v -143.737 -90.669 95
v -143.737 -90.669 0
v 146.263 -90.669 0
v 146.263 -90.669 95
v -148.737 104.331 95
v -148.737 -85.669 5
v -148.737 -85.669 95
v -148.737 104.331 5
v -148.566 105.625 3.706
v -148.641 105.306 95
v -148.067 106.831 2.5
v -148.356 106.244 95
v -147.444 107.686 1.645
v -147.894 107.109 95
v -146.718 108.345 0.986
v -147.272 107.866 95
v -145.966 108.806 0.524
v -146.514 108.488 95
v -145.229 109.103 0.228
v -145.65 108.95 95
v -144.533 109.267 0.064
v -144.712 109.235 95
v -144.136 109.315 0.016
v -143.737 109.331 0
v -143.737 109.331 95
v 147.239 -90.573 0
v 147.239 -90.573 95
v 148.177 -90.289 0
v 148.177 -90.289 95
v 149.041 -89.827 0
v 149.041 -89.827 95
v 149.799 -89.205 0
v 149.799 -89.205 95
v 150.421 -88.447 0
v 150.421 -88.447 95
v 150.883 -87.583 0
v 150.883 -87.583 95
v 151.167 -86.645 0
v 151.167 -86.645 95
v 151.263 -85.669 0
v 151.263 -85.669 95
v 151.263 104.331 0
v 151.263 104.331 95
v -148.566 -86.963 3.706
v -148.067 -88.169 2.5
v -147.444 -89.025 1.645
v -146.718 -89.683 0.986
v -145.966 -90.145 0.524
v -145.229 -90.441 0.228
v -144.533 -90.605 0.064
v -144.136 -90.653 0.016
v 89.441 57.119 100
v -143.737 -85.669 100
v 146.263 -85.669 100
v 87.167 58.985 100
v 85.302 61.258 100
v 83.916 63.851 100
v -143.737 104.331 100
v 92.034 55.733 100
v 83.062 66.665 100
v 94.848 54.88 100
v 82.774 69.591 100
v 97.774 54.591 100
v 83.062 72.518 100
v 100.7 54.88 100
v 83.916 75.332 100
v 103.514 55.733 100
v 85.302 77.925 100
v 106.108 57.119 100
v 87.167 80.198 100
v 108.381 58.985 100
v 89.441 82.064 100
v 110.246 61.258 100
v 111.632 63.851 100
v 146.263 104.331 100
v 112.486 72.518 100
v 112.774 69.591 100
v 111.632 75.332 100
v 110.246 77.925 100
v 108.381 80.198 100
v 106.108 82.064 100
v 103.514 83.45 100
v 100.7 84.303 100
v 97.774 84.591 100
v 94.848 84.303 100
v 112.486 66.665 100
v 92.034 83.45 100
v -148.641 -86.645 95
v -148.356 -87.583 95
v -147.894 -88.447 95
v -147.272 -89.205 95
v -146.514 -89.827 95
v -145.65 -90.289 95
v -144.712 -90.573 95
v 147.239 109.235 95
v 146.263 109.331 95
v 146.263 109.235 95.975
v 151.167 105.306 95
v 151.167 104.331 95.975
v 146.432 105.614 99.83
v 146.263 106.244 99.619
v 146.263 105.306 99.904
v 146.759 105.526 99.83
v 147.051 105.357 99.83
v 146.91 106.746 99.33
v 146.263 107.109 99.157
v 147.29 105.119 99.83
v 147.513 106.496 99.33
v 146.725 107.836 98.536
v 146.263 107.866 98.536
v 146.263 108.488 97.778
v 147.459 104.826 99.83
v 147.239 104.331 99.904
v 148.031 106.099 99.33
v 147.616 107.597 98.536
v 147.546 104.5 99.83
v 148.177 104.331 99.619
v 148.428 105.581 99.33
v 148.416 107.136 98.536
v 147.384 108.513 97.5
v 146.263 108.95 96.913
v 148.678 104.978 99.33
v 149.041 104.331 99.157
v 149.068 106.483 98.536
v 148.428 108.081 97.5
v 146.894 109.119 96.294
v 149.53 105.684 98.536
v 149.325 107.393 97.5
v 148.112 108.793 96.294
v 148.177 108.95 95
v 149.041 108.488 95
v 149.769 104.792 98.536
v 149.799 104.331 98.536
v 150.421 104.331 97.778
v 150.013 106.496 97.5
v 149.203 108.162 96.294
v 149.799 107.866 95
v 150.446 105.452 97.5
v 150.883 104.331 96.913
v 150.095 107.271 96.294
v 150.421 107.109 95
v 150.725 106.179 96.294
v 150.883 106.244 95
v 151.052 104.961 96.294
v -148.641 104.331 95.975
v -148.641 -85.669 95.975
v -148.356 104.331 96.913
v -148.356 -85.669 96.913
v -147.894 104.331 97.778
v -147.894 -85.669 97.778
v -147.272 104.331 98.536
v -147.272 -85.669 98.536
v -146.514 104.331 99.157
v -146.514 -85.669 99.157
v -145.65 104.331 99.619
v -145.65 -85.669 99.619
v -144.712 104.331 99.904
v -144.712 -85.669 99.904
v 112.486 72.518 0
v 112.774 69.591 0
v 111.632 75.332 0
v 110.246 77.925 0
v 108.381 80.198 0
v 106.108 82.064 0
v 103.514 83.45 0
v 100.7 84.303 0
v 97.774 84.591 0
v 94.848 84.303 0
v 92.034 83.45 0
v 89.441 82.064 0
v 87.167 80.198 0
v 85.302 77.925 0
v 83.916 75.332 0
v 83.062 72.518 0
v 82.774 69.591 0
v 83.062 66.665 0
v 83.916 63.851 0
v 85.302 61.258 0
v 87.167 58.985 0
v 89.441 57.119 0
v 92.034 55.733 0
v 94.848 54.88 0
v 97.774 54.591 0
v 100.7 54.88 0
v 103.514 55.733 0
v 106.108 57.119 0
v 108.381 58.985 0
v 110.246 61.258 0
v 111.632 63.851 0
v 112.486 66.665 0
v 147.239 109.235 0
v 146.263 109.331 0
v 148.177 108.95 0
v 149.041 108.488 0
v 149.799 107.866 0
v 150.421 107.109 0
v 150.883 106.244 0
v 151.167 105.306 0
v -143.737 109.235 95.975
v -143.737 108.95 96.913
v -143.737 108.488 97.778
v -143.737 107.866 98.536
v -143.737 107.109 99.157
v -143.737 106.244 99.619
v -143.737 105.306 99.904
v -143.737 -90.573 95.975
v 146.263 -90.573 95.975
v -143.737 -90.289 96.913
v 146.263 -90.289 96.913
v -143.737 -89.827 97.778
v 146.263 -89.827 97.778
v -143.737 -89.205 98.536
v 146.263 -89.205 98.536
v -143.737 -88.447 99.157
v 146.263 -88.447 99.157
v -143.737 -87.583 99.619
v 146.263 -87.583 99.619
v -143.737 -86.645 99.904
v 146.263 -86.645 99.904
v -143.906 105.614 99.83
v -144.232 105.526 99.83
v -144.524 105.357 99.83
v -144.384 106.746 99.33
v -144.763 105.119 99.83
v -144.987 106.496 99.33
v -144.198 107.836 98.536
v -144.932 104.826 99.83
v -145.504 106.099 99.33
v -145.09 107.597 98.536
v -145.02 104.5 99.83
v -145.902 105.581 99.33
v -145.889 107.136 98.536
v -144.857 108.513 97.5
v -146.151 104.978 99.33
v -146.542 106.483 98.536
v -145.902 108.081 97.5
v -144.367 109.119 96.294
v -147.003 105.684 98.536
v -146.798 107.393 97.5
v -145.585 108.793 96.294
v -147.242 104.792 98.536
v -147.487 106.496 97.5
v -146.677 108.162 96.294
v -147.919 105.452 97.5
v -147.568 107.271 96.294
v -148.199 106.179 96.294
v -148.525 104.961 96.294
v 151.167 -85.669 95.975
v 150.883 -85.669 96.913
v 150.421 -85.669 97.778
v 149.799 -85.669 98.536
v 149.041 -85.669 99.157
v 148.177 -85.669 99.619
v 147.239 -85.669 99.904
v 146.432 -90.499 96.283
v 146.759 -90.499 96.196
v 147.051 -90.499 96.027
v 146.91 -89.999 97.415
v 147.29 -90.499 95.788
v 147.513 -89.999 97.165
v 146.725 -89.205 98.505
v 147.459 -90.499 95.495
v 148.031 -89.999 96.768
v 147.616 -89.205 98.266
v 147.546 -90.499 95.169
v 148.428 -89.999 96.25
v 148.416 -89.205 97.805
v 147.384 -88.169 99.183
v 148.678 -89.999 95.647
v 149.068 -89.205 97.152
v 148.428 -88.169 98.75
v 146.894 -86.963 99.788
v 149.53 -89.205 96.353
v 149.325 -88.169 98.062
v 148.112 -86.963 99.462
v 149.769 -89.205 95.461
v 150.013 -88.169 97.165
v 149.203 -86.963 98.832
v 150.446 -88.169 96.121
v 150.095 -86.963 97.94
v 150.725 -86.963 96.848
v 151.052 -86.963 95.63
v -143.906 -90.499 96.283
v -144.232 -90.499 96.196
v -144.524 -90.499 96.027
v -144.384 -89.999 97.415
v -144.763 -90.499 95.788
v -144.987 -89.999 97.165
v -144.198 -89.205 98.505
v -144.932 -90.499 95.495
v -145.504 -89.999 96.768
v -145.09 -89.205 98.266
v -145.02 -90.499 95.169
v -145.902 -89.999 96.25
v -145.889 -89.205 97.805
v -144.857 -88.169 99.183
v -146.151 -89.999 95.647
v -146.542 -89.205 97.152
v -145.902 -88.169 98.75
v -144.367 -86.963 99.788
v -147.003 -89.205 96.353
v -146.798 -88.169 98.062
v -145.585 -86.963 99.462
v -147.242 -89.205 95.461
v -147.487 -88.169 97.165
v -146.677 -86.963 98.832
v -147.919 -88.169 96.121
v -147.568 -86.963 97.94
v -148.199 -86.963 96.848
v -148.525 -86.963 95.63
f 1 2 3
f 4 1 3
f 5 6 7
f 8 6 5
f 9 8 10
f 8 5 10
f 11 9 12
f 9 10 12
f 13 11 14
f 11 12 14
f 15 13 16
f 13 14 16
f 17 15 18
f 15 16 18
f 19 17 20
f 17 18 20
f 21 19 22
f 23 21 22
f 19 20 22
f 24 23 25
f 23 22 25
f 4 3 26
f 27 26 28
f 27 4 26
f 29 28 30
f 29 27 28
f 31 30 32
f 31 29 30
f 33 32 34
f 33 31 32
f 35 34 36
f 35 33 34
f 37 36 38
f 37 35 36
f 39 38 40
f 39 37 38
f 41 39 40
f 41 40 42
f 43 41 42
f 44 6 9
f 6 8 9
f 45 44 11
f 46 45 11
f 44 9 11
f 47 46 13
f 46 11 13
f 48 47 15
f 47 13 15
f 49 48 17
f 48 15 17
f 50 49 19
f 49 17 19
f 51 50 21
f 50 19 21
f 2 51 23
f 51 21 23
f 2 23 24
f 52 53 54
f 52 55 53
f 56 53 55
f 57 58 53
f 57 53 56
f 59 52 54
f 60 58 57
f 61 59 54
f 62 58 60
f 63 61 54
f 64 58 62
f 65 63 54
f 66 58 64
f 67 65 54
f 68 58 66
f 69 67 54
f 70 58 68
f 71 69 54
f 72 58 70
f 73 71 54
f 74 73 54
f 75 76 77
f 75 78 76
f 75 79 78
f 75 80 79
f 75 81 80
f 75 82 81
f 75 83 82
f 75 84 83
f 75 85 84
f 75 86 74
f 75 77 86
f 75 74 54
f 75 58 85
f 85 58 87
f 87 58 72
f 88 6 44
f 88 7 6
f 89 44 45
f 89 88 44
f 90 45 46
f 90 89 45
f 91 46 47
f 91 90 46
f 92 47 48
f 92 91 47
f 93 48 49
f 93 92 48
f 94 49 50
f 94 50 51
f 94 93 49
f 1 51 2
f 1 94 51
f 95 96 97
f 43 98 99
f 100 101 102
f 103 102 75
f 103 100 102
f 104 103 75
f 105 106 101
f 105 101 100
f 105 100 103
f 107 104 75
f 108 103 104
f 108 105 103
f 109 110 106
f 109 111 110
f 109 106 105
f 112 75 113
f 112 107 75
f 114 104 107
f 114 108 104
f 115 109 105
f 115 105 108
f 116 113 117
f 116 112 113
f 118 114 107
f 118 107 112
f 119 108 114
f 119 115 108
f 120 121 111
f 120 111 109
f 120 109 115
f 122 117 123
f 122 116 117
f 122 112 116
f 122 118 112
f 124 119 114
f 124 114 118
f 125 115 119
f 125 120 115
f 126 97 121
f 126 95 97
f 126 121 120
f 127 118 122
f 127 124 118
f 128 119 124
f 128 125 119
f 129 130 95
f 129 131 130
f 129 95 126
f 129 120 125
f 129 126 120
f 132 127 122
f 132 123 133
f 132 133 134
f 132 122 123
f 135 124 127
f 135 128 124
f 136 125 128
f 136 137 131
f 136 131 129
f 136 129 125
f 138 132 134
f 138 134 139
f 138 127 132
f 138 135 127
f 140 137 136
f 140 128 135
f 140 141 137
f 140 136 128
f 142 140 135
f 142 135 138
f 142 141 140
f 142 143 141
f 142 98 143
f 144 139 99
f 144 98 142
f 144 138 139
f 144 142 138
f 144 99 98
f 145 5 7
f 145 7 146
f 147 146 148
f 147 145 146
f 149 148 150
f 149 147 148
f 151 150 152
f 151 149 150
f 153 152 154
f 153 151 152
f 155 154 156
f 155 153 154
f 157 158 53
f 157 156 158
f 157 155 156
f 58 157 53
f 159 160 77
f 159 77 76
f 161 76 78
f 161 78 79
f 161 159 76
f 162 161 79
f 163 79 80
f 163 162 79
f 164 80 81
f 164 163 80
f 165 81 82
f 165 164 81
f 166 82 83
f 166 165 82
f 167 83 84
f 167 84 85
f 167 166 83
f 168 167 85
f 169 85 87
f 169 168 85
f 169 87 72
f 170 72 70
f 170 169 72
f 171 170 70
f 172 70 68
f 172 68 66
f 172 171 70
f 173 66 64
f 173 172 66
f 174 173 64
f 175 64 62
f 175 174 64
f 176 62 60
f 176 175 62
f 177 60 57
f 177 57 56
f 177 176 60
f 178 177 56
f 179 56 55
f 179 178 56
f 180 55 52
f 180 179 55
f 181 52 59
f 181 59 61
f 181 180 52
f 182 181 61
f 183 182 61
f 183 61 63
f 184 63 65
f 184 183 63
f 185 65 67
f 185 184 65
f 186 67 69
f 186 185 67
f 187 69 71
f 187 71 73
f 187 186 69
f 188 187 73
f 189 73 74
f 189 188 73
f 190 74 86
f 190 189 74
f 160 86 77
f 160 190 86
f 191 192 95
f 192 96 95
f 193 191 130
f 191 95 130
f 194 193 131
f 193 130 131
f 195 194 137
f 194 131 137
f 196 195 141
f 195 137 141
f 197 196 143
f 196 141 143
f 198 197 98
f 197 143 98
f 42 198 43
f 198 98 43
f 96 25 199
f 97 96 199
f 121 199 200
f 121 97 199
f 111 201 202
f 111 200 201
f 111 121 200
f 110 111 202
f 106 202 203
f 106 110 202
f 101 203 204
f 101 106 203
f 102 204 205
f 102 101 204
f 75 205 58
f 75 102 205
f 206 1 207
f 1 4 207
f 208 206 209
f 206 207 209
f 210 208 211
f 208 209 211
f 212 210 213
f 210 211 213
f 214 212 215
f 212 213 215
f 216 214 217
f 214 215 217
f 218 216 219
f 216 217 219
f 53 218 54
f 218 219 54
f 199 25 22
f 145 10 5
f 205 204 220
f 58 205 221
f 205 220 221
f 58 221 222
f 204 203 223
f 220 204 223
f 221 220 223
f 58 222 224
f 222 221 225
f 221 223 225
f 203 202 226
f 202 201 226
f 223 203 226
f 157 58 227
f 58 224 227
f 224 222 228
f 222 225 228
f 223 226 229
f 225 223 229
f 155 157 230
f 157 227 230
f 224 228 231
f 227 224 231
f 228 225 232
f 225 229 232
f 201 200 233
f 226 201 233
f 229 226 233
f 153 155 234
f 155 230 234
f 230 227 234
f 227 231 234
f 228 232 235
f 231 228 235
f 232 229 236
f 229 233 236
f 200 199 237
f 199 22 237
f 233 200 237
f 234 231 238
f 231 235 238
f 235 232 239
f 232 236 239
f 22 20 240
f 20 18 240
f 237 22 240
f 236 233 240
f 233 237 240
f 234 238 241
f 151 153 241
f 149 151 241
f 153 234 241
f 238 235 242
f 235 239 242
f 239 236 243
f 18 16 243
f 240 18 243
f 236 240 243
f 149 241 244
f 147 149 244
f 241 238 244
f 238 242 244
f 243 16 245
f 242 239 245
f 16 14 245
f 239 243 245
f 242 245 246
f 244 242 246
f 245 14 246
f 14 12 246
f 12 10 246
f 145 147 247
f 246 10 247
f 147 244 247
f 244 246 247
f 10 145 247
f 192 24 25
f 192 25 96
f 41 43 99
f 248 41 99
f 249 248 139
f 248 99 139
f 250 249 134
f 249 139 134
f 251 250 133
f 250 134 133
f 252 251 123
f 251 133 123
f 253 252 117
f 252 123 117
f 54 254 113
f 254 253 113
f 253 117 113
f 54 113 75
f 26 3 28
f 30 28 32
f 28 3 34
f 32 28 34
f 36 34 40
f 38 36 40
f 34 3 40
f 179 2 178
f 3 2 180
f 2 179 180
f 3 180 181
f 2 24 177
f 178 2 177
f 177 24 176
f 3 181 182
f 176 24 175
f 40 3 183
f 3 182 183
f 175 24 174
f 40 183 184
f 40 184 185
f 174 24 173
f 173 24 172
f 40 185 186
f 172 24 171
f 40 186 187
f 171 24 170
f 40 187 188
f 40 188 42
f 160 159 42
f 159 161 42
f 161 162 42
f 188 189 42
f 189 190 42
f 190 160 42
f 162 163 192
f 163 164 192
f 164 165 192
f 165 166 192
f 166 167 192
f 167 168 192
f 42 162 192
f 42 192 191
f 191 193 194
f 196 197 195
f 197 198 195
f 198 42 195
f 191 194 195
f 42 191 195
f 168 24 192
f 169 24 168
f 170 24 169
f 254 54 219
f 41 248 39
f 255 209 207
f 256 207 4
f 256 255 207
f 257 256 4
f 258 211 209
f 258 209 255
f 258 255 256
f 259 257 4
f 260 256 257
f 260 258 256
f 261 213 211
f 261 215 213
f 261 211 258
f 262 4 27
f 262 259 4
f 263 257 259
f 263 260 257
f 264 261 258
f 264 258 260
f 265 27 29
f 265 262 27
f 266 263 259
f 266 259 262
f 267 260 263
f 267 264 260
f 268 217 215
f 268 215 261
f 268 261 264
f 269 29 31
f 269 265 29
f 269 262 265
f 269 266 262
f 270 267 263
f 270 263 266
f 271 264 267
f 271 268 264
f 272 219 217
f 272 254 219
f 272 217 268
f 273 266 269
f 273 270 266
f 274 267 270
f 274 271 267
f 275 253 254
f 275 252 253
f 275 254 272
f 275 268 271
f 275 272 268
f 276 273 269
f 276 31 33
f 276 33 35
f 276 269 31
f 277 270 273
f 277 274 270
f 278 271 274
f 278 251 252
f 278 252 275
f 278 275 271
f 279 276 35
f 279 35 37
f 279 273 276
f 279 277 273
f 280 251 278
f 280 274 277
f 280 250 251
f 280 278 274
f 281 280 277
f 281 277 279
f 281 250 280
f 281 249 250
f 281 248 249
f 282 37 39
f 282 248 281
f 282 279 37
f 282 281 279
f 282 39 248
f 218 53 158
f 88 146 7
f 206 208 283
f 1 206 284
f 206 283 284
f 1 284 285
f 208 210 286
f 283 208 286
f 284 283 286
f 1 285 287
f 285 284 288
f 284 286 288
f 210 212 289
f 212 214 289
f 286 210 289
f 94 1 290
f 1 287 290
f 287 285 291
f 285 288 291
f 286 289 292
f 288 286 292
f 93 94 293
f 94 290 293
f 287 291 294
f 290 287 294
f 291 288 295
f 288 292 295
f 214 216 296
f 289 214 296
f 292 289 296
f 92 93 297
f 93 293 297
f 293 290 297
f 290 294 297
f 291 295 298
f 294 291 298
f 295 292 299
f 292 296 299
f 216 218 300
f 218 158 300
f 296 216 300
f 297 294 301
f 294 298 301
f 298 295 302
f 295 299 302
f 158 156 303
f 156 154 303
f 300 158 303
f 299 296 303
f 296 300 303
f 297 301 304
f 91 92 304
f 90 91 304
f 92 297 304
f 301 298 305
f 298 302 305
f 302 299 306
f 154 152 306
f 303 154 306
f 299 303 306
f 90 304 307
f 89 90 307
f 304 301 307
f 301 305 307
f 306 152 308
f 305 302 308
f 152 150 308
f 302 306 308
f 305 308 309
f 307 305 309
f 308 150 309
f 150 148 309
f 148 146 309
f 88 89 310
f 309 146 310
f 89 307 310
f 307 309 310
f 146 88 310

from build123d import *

# Parameters (mm, degrees)
F0_W     = 300
F0_H     = 200
F0_R     = 15
F1_DEPTH = 100
F2_R     = 5


with BuildPart() as f1:
    # F0 (on Top) → F1 (new body)
    with BuildSketch(Plane.XY):
        with Locations((1.263371, 9.330785)):
            Rectangle(F0_W, F0_H)
        with Locations((97.774066, 69.591478)):
            Circle(F0_R, mode=Mode.SUBTRACT)
    extrude(amount=F1_DEPTH)

    # F2
    f2_edges = [f1.edges().sort_by_distance(p)[0] for p in [
        (-148.736629, 109.330785, 50),
        (151.263371, 109.330785, 50),
        (1.263371, 109.330785, 100),
        (151.263371, 9.330785, 100),
        (-148.736629, 9.330785, 100),
        (1.263371, -90.669215, 100),
        (-148.736629, -90.669215, 50),
        (-148.736629, 9.330785, 0),
        (151.263371, -90.669215, 50),
    ]]
    fillet(f2_edges, radius=F2_R)


solid = f1.part
